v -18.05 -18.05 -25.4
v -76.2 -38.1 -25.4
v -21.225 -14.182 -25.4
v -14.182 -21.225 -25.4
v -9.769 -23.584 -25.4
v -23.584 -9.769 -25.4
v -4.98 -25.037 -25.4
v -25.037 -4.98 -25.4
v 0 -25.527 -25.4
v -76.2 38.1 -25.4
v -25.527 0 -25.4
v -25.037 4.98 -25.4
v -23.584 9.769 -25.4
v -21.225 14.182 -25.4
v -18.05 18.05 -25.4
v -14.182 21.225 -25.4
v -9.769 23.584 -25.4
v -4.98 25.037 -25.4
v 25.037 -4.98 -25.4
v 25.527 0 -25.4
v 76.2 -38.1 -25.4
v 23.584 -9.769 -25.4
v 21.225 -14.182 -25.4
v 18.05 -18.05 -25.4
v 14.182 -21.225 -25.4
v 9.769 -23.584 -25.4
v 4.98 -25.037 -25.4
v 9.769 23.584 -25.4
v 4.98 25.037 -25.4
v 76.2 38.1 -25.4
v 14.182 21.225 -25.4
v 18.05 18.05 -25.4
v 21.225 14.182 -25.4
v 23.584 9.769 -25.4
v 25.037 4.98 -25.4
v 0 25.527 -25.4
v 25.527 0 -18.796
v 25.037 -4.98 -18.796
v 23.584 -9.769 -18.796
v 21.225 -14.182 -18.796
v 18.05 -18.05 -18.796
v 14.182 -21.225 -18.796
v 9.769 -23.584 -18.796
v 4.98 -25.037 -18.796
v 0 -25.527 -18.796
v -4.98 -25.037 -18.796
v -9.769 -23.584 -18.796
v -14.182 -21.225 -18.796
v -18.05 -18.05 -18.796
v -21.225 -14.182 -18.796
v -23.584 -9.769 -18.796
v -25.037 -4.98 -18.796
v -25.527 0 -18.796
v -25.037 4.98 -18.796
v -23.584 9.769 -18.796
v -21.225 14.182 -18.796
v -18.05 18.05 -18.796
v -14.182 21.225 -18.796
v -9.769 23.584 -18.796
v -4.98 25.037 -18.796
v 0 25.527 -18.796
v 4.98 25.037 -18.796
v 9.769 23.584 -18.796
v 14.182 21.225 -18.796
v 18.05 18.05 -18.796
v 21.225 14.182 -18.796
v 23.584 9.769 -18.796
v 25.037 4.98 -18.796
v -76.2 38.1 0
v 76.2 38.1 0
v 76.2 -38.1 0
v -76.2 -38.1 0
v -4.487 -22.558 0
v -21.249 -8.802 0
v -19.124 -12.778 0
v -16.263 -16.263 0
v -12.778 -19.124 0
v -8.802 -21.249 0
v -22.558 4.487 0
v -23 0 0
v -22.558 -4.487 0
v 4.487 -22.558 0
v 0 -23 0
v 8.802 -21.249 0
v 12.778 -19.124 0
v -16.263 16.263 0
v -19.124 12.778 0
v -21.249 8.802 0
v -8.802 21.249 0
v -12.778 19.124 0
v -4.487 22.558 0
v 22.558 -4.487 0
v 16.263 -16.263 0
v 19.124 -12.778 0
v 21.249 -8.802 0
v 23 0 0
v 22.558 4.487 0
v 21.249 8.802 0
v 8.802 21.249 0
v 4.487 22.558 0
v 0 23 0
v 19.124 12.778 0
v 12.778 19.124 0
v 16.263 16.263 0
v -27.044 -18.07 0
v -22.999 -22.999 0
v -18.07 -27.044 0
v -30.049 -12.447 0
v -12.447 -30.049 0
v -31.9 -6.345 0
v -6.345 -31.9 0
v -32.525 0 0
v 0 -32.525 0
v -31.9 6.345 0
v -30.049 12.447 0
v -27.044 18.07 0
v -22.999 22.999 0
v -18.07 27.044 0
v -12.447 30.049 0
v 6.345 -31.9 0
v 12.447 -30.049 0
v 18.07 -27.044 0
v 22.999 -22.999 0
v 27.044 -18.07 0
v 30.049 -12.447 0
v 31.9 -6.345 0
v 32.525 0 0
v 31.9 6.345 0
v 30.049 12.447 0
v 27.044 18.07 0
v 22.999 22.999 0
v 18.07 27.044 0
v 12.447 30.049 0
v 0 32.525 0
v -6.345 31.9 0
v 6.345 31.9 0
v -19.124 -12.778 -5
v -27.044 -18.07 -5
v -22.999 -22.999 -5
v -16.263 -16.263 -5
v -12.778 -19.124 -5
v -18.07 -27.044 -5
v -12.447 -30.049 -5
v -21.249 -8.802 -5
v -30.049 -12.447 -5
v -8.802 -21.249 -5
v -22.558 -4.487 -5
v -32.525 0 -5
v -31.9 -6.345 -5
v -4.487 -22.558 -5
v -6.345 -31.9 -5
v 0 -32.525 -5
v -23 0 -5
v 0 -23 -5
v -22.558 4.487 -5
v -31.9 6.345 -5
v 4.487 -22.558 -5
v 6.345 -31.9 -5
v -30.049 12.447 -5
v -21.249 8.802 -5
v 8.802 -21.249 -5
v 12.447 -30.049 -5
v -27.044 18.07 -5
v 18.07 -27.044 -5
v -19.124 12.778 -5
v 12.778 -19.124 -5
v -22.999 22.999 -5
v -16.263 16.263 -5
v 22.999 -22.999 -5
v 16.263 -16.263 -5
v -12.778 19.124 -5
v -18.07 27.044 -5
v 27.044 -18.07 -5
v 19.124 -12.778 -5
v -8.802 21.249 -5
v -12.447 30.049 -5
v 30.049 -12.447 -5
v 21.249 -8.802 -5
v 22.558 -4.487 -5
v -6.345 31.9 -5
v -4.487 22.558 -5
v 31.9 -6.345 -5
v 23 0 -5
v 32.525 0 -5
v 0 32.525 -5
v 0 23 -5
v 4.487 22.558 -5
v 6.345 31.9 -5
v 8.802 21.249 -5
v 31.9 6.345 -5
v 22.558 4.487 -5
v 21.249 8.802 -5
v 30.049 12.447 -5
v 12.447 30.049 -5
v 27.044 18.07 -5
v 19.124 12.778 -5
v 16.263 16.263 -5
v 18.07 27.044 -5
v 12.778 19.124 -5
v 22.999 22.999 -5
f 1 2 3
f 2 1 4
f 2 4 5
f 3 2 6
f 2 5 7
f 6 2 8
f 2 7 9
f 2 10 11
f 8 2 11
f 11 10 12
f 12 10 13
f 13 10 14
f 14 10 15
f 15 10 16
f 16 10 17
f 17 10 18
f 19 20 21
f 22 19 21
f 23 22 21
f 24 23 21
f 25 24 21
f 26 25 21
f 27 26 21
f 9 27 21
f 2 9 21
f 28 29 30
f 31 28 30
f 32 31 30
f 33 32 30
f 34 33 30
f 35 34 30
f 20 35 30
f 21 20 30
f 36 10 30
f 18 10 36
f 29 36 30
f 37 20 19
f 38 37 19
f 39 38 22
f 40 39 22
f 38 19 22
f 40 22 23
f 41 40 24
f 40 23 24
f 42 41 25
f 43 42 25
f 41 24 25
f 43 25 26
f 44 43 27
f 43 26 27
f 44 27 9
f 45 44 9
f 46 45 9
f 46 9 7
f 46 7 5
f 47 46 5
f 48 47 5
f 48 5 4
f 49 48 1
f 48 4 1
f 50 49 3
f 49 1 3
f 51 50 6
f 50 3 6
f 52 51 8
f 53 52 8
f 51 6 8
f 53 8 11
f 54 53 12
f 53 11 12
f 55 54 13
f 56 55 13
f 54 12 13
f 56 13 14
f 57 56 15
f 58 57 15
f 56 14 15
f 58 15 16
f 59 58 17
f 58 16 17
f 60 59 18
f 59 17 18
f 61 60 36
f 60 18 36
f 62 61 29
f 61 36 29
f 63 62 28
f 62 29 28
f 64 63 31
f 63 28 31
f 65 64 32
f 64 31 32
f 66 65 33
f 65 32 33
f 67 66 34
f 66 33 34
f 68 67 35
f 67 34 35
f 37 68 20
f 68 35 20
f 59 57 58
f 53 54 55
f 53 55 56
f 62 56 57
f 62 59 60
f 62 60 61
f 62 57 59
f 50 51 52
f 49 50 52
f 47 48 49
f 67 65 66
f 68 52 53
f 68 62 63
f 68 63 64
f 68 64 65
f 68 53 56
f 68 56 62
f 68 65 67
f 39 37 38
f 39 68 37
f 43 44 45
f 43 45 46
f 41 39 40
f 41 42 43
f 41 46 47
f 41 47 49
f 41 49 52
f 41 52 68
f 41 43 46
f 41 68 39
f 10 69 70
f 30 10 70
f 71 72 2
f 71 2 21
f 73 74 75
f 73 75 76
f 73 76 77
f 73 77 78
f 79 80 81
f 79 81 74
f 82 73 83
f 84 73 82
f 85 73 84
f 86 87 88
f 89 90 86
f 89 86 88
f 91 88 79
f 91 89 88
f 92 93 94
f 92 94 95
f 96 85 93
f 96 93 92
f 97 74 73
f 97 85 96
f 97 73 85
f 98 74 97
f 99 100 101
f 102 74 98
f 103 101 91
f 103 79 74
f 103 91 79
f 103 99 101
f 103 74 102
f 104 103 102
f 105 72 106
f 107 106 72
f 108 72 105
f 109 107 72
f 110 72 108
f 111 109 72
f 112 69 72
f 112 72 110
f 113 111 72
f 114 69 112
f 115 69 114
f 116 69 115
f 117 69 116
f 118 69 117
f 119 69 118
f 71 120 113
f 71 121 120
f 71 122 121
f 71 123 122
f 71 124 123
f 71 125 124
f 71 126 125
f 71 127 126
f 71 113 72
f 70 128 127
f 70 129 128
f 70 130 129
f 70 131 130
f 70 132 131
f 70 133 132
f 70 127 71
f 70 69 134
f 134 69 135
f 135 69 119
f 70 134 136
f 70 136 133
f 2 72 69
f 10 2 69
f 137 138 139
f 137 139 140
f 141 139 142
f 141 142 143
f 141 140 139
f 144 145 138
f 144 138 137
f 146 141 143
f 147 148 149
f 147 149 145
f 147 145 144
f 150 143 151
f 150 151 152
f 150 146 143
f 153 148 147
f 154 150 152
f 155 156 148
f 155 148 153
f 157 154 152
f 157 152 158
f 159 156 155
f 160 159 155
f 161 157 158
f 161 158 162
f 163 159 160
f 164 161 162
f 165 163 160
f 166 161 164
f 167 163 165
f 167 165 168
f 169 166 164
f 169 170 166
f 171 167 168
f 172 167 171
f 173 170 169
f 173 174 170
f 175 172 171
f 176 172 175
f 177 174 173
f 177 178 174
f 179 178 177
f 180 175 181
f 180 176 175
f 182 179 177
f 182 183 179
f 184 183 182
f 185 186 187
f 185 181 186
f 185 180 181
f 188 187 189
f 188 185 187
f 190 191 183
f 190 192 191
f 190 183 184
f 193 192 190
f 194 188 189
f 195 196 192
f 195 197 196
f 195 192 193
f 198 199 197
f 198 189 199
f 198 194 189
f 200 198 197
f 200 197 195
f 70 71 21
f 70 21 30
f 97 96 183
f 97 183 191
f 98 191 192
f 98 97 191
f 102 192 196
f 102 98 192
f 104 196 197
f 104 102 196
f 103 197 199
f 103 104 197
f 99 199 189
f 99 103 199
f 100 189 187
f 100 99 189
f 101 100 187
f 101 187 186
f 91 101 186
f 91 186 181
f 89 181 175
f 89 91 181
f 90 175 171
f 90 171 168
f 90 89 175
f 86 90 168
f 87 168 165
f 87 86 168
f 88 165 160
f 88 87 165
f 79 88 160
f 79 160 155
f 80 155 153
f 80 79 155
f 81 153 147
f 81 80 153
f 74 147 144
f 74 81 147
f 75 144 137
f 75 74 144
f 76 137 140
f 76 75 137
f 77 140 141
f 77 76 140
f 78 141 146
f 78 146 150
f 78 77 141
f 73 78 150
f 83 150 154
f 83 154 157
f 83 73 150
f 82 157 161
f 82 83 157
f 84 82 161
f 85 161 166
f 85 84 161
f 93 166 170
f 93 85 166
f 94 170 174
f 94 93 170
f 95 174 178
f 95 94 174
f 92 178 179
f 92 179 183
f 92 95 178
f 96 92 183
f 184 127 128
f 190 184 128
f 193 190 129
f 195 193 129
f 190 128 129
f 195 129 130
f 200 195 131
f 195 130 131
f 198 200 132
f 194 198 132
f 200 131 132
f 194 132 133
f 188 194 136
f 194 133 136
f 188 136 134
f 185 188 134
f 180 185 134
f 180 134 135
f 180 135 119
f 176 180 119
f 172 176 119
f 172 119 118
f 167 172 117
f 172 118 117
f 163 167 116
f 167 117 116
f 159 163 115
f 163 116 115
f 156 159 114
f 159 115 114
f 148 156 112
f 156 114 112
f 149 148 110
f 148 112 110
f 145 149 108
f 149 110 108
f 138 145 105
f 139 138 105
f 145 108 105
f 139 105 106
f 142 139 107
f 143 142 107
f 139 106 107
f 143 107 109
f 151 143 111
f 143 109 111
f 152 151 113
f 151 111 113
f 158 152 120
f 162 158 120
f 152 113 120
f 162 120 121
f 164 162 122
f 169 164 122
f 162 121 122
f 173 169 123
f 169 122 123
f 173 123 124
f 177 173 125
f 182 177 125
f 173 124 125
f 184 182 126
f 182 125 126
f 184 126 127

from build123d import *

# Parameters (mm, degrees)
F0_W     = 152.4
F0_H     = 76.2
F0_R     = 32.525
F0_R_2   = 23.5
F0_R_3   = 23
F1_DEPTH = 25.4
F2_DEPTH = 5
F3_R     = 25.527
F4_DEPTH = 6.604


with BuildPart() as f1:
    # F0 (on Top) → F1 (new body)
    with BuildSketch(Plane.XY):
        Rectangle(F0_W, F0_H)
        Circle(F0_R, mode=Mode.SUBTRACT)
        Circle(F0_R)
        Circle(F0_R_2, mode=Mode.SUBTRACT)
        Circle(F0_R_2)
        Circle(F0_R_3, mode=Mode.SUBTRACT)
        Circle(F0_R_3)
    extrude(amount=-F1_DEPTH)

    # F0 (on Top) → F2 (cut)
    with BuildSketch(Plane.XY):
        Circle(F0_R)
        Circle(F0_R_2, mode=Mode.SUBTRACT)
        Circle(F0_R_2)
        Circle(F0_R_3, mode=Mode.SUBTRACT)
    extrude(amount=-F2_DEPTH, mode=Mode.SUBTRACT)

    # F3 (on face) → F4 (cut)
    with BuildSketch(Plane(origin=(0, 0, -25.4), x_dir=(1, 0, 0), z_dir=(0, 0, -1))):
        Circle(F3_R)
    extrude(amount=-F4_DEPTH, mode=Mode.SUBTRACT)


solid = f1.part
